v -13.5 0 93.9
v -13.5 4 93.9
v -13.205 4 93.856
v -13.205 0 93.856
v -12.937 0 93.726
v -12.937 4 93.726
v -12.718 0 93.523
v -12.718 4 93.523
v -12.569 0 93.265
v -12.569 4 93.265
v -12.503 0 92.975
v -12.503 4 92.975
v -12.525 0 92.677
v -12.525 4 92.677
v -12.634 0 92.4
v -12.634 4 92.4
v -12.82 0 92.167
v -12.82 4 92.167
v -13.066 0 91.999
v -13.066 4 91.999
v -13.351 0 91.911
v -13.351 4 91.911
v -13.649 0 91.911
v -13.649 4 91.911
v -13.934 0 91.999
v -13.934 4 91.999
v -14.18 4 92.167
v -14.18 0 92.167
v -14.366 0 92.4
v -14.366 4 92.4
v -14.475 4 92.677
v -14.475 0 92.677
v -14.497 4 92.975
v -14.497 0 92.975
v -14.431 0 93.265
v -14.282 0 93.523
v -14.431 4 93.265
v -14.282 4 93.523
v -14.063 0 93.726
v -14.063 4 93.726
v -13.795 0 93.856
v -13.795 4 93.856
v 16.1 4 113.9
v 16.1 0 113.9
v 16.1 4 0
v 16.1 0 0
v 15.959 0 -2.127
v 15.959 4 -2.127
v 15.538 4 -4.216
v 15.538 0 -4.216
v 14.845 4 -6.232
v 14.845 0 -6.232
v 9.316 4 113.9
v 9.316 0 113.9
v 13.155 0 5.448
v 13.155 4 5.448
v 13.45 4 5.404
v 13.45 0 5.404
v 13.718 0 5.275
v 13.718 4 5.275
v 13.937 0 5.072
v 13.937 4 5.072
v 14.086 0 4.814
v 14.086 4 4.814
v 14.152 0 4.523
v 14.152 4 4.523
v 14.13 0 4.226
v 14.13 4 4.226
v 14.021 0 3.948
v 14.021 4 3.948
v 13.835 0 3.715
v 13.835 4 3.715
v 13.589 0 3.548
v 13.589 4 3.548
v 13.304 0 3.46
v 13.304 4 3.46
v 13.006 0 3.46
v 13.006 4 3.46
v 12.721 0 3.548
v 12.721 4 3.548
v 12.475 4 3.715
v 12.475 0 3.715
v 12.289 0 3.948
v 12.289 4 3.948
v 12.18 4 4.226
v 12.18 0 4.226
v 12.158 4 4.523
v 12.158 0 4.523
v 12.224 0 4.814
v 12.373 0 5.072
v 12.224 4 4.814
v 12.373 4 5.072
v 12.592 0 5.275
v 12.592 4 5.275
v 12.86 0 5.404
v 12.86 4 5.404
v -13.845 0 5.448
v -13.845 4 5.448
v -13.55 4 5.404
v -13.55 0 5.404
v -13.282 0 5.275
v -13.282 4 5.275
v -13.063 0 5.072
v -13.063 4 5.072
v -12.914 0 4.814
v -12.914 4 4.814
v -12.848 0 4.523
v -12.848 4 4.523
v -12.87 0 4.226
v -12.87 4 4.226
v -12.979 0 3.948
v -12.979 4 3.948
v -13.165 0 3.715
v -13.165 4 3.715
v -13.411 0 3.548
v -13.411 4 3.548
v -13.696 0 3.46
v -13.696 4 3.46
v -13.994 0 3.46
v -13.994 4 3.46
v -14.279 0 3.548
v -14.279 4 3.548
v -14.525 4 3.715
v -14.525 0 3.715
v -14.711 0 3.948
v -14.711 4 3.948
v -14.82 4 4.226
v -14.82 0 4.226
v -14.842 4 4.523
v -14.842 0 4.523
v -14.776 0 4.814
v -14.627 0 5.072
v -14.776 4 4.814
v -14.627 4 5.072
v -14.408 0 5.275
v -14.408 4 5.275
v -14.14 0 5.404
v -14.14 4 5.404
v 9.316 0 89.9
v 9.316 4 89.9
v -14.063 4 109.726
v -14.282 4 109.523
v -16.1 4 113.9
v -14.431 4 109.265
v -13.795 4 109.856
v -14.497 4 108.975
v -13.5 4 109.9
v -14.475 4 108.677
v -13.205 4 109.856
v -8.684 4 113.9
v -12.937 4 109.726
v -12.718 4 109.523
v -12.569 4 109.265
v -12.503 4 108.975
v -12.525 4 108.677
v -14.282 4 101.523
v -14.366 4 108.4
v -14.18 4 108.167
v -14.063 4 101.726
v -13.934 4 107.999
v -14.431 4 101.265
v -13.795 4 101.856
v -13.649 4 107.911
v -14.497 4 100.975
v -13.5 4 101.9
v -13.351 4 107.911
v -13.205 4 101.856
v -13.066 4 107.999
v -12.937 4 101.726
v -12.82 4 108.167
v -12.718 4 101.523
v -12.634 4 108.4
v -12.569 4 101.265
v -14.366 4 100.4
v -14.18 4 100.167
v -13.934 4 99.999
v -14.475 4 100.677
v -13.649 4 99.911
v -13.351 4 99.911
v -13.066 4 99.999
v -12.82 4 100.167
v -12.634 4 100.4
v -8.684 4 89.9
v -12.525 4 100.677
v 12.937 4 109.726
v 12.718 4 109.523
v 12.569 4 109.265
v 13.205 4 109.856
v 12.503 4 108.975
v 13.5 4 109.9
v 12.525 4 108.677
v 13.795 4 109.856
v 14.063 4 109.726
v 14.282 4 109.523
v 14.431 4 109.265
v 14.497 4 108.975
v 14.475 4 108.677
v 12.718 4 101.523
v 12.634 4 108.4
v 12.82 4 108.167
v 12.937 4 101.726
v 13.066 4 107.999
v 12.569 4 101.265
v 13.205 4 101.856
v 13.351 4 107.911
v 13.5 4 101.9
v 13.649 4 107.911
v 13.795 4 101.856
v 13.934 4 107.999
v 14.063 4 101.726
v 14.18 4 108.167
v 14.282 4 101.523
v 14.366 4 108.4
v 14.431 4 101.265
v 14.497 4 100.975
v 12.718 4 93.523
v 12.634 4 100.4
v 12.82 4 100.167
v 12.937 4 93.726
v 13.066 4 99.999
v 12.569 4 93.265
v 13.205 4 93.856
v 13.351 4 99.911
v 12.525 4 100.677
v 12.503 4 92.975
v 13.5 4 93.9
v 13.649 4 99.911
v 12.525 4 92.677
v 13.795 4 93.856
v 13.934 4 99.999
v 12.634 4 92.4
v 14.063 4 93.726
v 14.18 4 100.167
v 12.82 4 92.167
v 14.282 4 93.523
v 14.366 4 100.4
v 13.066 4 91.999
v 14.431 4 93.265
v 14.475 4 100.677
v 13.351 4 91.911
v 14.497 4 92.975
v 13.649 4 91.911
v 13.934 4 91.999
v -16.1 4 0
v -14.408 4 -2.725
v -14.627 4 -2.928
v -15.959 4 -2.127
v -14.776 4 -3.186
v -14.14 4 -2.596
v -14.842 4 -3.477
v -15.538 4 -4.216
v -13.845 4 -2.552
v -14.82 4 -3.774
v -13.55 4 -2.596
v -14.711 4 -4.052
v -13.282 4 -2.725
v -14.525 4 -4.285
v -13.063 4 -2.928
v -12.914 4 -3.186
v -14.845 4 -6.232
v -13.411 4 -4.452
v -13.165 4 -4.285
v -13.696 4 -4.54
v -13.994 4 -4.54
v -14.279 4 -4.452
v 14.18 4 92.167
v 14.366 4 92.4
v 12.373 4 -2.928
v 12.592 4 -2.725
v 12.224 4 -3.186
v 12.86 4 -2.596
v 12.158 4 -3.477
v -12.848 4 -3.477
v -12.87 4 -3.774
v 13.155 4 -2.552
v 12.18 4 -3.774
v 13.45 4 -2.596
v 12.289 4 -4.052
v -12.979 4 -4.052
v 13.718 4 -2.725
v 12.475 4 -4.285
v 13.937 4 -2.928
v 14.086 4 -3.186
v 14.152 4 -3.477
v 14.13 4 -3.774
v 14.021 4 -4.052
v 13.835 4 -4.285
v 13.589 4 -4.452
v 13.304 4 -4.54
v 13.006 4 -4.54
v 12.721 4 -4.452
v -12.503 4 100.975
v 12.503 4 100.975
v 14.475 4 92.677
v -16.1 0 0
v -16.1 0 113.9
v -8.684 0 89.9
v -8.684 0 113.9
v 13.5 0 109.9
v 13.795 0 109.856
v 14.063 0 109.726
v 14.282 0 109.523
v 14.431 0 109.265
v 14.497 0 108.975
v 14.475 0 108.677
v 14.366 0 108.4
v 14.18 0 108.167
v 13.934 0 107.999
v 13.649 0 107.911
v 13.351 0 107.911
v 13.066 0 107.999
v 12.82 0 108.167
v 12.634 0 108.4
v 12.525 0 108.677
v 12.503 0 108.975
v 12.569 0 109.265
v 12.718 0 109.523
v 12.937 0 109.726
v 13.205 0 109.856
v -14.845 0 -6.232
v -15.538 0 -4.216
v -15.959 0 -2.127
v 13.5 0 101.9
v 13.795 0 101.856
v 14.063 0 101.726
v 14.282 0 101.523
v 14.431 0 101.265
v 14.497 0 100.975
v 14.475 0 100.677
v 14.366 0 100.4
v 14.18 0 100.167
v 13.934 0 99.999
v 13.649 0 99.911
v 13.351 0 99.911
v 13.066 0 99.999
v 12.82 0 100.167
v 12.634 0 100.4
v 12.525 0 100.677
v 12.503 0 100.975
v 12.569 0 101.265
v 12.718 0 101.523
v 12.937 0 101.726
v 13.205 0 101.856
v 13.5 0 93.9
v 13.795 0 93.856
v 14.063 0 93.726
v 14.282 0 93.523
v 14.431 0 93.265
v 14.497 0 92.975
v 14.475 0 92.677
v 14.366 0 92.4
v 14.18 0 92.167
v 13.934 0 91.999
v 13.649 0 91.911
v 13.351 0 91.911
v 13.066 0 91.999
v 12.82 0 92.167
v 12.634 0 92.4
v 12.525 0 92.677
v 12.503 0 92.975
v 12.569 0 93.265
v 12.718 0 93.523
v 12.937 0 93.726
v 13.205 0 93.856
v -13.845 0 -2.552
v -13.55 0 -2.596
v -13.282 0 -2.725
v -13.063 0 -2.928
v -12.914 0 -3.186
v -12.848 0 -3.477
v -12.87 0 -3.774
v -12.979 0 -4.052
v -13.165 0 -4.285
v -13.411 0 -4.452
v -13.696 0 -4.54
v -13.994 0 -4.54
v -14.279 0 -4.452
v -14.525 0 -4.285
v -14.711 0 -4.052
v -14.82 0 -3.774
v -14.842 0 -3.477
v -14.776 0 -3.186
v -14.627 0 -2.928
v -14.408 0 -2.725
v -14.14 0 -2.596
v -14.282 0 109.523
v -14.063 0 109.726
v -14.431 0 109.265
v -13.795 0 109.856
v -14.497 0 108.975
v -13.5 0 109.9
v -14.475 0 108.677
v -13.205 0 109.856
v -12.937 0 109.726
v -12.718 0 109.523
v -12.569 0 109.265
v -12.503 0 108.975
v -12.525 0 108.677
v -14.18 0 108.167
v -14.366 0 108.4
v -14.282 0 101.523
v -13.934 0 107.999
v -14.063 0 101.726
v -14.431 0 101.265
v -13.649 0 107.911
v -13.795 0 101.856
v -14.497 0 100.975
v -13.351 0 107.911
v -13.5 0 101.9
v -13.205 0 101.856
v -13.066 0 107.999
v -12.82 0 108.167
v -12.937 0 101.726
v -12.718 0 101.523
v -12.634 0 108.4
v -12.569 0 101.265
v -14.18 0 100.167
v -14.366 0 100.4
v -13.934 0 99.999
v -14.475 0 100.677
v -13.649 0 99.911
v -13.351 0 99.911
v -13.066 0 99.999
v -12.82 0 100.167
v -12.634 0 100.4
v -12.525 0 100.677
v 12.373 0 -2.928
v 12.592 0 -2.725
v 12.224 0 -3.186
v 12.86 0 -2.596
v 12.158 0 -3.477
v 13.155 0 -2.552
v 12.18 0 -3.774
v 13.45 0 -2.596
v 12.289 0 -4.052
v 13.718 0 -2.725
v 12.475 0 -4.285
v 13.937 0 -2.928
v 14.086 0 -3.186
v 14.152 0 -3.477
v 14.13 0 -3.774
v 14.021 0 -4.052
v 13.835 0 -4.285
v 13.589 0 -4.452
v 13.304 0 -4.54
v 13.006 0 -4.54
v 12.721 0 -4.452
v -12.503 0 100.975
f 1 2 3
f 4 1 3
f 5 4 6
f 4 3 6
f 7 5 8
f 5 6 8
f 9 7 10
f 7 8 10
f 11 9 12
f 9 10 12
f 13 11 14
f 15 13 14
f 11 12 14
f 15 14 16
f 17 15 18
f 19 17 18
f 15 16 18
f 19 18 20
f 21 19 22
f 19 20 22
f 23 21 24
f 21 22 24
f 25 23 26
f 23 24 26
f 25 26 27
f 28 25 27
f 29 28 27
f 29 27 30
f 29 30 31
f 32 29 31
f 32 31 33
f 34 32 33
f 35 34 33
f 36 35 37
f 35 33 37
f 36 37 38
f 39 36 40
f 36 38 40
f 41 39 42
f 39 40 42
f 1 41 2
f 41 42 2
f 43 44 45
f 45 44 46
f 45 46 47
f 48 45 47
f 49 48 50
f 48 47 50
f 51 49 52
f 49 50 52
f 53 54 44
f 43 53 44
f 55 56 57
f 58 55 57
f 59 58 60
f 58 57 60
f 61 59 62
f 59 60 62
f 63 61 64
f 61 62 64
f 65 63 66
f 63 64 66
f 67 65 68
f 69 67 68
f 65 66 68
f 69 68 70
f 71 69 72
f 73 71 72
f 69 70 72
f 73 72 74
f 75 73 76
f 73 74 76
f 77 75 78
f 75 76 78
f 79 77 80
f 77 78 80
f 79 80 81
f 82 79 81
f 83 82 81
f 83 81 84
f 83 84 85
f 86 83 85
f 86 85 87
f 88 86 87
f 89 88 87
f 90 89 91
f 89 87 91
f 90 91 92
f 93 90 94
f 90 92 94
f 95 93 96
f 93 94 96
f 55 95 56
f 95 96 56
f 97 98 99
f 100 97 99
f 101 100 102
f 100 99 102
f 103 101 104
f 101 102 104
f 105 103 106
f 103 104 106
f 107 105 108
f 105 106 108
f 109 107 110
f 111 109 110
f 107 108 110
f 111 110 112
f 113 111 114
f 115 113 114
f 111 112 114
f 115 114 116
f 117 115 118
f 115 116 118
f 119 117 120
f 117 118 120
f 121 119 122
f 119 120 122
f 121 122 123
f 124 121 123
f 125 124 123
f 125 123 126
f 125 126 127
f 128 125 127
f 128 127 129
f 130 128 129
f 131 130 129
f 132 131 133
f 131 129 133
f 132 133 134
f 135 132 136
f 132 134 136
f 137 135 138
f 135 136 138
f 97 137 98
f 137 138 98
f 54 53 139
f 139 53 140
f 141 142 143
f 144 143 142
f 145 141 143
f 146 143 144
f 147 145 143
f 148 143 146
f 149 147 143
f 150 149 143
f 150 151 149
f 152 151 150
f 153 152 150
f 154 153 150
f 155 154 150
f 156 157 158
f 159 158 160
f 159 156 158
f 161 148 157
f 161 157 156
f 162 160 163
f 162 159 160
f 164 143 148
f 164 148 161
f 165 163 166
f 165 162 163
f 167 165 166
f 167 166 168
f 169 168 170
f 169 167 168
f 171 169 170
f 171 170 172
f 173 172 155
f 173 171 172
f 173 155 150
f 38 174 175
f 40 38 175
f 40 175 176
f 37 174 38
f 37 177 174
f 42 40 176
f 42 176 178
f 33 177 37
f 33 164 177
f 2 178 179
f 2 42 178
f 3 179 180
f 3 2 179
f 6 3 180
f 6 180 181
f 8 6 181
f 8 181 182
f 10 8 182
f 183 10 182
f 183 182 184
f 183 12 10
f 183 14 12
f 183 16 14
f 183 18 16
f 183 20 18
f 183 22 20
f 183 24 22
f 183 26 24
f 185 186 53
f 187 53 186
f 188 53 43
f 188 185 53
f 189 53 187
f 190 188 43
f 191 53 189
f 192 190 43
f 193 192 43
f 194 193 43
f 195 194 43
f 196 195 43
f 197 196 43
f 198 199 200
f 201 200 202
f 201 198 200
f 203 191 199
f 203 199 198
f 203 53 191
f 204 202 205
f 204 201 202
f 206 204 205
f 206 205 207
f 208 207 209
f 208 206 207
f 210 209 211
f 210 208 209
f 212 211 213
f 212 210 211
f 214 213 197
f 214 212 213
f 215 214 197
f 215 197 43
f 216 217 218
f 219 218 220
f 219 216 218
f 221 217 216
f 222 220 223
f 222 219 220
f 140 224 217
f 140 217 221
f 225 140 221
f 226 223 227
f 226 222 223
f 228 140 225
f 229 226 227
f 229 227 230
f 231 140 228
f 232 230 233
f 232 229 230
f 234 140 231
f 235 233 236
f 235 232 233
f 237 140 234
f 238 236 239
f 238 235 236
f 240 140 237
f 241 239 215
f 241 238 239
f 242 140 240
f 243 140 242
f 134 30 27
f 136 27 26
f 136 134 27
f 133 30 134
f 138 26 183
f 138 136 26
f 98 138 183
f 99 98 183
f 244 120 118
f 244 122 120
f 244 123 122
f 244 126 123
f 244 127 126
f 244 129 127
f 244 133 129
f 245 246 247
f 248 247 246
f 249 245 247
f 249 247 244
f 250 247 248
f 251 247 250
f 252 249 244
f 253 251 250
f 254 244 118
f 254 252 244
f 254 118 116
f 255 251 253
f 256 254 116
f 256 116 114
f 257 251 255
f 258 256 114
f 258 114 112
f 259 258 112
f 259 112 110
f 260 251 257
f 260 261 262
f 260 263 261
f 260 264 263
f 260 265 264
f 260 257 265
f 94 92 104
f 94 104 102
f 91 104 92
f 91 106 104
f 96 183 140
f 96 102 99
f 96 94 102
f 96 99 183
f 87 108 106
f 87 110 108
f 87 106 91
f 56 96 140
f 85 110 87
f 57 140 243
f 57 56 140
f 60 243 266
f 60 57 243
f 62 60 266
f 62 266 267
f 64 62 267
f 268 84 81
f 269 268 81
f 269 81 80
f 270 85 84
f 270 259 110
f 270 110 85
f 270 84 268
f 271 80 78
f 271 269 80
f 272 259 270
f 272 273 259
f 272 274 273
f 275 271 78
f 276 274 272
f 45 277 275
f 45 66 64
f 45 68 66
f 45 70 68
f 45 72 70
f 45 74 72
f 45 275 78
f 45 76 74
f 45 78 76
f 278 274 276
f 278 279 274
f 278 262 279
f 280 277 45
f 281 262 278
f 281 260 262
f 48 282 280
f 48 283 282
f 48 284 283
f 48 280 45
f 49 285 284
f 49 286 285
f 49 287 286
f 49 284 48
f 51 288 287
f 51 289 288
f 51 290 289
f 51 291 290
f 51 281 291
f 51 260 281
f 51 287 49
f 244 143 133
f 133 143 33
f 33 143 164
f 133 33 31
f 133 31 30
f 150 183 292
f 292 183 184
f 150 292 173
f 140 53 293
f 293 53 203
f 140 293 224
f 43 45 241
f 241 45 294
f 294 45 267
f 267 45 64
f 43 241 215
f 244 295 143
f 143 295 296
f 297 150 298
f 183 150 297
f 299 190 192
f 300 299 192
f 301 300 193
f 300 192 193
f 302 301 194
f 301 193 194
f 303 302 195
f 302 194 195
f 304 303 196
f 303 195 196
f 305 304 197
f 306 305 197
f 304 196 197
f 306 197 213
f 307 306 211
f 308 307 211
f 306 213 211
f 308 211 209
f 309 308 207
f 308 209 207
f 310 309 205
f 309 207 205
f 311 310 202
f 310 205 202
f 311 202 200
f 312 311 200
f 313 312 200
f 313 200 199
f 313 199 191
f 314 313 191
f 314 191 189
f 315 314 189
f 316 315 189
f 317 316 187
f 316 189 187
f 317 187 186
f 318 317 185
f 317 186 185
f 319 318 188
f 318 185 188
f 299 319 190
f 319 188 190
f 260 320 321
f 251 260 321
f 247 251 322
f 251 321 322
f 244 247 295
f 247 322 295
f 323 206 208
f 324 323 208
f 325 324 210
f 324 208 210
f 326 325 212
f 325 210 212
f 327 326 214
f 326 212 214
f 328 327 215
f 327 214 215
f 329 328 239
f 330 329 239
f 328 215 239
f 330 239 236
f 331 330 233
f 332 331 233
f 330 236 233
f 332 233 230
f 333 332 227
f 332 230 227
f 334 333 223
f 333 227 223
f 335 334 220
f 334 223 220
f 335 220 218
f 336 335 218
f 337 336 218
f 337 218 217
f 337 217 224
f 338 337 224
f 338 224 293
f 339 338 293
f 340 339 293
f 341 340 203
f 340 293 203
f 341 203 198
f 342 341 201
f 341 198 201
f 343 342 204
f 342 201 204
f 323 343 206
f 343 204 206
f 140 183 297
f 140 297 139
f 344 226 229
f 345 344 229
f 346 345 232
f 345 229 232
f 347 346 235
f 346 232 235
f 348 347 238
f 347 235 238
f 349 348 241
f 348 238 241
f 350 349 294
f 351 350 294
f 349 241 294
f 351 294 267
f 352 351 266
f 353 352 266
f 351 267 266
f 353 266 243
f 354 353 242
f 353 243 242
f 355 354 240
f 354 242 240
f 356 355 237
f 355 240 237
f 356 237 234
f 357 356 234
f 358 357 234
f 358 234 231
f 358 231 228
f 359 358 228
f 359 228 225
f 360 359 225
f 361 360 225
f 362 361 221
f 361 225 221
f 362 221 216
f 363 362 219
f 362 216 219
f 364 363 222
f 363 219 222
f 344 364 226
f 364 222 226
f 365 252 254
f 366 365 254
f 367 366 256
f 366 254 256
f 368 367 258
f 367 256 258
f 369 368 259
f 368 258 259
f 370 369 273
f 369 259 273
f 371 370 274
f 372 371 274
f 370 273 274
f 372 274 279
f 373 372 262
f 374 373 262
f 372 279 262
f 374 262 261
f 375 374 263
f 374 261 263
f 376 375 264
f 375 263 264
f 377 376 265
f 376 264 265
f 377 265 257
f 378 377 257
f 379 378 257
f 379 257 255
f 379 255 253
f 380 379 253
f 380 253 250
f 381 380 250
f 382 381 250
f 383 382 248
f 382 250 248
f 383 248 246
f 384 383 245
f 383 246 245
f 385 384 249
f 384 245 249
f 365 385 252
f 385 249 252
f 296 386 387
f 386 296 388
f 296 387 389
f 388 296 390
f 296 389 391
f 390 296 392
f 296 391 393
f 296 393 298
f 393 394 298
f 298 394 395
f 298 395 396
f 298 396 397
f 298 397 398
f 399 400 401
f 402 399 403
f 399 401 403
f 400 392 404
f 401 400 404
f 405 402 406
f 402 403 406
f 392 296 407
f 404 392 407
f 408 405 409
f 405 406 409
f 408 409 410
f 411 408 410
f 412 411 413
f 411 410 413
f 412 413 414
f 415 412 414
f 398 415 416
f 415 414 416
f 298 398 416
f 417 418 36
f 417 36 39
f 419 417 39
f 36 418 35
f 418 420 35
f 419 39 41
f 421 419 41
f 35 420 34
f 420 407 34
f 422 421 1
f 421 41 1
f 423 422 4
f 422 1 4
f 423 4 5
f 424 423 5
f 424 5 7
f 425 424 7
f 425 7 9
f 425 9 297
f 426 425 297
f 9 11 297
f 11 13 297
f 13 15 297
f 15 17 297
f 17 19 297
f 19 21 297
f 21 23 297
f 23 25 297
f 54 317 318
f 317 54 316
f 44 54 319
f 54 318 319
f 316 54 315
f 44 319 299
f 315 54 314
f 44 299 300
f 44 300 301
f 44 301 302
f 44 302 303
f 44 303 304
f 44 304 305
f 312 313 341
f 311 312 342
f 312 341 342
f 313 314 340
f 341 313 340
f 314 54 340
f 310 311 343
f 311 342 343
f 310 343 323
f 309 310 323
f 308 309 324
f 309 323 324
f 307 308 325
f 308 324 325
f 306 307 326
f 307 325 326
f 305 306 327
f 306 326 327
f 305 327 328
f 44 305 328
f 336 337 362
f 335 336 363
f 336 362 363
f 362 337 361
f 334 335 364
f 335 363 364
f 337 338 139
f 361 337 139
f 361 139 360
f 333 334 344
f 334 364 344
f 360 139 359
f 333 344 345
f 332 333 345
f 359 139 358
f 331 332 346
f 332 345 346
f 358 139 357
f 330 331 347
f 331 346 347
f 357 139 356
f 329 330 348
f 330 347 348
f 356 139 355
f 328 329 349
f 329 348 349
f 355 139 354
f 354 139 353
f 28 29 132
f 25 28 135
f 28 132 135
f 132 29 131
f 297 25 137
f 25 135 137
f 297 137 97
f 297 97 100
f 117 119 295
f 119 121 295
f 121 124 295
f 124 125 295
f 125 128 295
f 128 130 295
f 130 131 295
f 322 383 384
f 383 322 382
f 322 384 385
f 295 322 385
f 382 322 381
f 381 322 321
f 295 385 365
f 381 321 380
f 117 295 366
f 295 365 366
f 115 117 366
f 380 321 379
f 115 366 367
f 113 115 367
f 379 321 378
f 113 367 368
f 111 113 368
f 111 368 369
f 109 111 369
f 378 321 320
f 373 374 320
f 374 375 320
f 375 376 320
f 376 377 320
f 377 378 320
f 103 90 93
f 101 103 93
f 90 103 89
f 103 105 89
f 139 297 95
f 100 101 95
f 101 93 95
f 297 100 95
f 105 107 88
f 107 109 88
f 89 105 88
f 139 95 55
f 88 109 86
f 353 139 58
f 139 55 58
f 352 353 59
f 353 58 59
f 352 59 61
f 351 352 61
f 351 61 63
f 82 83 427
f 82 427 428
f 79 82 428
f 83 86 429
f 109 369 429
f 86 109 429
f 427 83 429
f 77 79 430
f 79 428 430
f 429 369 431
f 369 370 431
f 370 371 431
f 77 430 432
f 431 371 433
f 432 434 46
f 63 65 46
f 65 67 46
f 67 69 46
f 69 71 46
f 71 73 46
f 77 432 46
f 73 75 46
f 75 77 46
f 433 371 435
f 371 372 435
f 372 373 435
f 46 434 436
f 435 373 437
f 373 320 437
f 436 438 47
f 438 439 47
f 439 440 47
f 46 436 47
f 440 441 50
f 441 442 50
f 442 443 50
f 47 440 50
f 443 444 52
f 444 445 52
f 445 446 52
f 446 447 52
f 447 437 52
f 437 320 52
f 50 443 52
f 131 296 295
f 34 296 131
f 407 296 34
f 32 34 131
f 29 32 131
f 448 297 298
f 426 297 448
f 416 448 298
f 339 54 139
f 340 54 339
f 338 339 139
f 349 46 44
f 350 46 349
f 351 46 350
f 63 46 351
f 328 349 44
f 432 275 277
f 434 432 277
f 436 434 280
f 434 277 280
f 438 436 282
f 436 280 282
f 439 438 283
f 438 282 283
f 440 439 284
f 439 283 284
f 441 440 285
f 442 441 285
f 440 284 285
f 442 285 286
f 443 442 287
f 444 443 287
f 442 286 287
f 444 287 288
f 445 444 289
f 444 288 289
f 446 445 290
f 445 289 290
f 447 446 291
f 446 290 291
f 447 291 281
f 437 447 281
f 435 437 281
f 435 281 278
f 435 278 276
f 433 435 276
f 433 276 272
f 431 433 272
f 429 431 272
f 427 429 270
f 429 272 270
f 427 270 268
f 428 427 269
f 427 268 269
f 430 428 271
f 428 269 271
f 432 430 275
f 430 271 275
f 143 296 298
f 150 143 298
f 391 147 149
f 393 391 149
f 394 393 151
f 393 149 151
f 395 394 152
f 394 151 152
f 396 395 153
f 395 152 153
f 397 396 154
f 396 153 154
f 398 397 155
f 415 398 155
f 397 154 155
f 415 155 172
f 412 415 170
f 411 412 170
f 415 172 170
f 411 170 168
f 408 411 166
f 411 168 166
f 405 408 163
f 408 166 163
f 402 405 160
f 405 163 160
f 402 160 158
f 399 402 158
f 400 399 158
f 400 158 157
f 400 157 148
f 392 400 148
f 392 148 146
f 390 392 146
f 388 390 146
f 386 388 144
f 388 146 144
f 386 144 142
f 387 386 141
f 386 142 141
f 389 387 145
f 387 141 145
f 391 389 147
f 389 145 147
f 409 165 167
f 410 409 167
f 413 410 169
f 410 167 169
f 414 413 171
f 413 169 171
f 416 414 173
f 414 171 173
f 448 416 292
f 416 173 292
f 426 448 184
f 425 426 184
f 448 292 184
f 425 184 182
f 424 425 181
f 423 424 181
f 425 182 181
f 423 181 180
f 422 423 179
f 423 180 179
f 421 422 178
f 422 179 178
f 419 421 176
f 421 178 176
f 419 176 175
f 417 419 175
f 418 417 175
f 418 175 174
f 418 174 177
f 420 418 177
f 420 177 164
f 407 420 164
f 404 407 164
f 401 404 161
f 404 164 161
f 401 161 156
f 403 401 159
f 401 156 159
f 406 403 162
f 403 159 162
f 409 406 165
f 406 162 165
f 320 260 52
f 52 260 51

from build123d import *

# Parameters (mm, degrees)
BOSS_EXTRU_1_DEPTH      = 4
ESQUISSE2_R             = 1
ESQUISSE2_W             = 29.690189182
ESQUISSE2_H             = 17.433113391
ENL_V_MAT_EXTRU_1_DEPTH = 4
ESQUISSE4_W             = 18
ESQUISSE4_H             = 24
ENL_V_MAT_EXTRU_2_DEPTH = 10


with BuildPart() as part:
    # Esquisse1 → Boss.-Extru.1 (new body)
    with BuildSketch(Plane(origin=(0, 0, 0), x_dir=(1, 0, 0), z_dir=(0, 1, 0))):
        with BuildLine():
            Line((-16.1, 0), (-16.1, -113.9))
            Line((-16.1, -113.9), (16.1, -113.9))
            Line((16.1, -113.9), (16.1, 0))
            ThreePointArc((16.1, 0), (0, 16.1), (-16.1, 0))
        make_face()
    extrude(amount=BOSS_EXTRU_1_DEPTH)

    # Esquisse2 → Enlèv. mat.-Extru.1 (cut)
    with BuildSketch(Plane(origin=(0, 4, 0), x_dir=(1, 0, 0), z_dir=(0, 1, 0))):
        with Locations(Location((-13.5, -92.9, 0), (0, 0, 270))):
            Circle(ESQUISSE2_R)
        with Locations(Location((-13.5, -100.9, 0), (0, 0, 270))):
            Circle(ESQUISSE2_R)
        with Locations(Location((13.5, -92.9, 0), (0, 0, 270))):
            Circle(ESQUISSE2_R)
        with Locations(Location((13.5, -100.9, 0), (0, 0, 270))):
            Circle(ESQUISSE2_R)
        with Locations(Location((13.5, -108.9, 0), (0, 0, 270))):
            Circle(ESQUISSE2_R)
        with Locations(Location((-13.5, -108.9, 0), (0, 0, 270))):
            Circle(ESQUISSE2_R)
        with Locations(Location((13.154905409, -4.448481213, 0), (0, 0, 270))):
            Circle(ESQUISSE2_R)
        with Locations(Location((-13.845094591, 3.551518787, 0), (0, 0, 270))):
            Circle(ESQUISSE2_R)
        with Locations(Location((-13.845094591, -4.448481213, 0), (0, 0, 270))):
            Circle(ESQUISSE2_R)
        with Locations(Location((13.154905409, 3.551518787, 0), (0, 0, 270))):
            Circle(ESQUISSE2_R)
        with Locations((0, 14.948183015)):
            Rectangle(ESQUISSE2_W, ESQUISSE2_H)
    extrude(amount=-ENL_V_MAT_EXTRU_1_DEPTH, mode=Mode.SUBTRACT)

    # Esquisse4 → Enlèv. mat.-Extru.2 (cut)
    with BuildSketch(Plane(origin=(0, 4, 0), x_dir=(1, 0, 0), z_dir=(0, 1, 0))):
        with Locations((0.316024011, -101.9)):
            Rectangle(ESQUISSE4_W, ESQUISSE4_H)
    extrude(amount=-ENL_V_MAT_EXTRU_2_DEPTH, mode=Mode.SUBTRACT)


solid = part.part
